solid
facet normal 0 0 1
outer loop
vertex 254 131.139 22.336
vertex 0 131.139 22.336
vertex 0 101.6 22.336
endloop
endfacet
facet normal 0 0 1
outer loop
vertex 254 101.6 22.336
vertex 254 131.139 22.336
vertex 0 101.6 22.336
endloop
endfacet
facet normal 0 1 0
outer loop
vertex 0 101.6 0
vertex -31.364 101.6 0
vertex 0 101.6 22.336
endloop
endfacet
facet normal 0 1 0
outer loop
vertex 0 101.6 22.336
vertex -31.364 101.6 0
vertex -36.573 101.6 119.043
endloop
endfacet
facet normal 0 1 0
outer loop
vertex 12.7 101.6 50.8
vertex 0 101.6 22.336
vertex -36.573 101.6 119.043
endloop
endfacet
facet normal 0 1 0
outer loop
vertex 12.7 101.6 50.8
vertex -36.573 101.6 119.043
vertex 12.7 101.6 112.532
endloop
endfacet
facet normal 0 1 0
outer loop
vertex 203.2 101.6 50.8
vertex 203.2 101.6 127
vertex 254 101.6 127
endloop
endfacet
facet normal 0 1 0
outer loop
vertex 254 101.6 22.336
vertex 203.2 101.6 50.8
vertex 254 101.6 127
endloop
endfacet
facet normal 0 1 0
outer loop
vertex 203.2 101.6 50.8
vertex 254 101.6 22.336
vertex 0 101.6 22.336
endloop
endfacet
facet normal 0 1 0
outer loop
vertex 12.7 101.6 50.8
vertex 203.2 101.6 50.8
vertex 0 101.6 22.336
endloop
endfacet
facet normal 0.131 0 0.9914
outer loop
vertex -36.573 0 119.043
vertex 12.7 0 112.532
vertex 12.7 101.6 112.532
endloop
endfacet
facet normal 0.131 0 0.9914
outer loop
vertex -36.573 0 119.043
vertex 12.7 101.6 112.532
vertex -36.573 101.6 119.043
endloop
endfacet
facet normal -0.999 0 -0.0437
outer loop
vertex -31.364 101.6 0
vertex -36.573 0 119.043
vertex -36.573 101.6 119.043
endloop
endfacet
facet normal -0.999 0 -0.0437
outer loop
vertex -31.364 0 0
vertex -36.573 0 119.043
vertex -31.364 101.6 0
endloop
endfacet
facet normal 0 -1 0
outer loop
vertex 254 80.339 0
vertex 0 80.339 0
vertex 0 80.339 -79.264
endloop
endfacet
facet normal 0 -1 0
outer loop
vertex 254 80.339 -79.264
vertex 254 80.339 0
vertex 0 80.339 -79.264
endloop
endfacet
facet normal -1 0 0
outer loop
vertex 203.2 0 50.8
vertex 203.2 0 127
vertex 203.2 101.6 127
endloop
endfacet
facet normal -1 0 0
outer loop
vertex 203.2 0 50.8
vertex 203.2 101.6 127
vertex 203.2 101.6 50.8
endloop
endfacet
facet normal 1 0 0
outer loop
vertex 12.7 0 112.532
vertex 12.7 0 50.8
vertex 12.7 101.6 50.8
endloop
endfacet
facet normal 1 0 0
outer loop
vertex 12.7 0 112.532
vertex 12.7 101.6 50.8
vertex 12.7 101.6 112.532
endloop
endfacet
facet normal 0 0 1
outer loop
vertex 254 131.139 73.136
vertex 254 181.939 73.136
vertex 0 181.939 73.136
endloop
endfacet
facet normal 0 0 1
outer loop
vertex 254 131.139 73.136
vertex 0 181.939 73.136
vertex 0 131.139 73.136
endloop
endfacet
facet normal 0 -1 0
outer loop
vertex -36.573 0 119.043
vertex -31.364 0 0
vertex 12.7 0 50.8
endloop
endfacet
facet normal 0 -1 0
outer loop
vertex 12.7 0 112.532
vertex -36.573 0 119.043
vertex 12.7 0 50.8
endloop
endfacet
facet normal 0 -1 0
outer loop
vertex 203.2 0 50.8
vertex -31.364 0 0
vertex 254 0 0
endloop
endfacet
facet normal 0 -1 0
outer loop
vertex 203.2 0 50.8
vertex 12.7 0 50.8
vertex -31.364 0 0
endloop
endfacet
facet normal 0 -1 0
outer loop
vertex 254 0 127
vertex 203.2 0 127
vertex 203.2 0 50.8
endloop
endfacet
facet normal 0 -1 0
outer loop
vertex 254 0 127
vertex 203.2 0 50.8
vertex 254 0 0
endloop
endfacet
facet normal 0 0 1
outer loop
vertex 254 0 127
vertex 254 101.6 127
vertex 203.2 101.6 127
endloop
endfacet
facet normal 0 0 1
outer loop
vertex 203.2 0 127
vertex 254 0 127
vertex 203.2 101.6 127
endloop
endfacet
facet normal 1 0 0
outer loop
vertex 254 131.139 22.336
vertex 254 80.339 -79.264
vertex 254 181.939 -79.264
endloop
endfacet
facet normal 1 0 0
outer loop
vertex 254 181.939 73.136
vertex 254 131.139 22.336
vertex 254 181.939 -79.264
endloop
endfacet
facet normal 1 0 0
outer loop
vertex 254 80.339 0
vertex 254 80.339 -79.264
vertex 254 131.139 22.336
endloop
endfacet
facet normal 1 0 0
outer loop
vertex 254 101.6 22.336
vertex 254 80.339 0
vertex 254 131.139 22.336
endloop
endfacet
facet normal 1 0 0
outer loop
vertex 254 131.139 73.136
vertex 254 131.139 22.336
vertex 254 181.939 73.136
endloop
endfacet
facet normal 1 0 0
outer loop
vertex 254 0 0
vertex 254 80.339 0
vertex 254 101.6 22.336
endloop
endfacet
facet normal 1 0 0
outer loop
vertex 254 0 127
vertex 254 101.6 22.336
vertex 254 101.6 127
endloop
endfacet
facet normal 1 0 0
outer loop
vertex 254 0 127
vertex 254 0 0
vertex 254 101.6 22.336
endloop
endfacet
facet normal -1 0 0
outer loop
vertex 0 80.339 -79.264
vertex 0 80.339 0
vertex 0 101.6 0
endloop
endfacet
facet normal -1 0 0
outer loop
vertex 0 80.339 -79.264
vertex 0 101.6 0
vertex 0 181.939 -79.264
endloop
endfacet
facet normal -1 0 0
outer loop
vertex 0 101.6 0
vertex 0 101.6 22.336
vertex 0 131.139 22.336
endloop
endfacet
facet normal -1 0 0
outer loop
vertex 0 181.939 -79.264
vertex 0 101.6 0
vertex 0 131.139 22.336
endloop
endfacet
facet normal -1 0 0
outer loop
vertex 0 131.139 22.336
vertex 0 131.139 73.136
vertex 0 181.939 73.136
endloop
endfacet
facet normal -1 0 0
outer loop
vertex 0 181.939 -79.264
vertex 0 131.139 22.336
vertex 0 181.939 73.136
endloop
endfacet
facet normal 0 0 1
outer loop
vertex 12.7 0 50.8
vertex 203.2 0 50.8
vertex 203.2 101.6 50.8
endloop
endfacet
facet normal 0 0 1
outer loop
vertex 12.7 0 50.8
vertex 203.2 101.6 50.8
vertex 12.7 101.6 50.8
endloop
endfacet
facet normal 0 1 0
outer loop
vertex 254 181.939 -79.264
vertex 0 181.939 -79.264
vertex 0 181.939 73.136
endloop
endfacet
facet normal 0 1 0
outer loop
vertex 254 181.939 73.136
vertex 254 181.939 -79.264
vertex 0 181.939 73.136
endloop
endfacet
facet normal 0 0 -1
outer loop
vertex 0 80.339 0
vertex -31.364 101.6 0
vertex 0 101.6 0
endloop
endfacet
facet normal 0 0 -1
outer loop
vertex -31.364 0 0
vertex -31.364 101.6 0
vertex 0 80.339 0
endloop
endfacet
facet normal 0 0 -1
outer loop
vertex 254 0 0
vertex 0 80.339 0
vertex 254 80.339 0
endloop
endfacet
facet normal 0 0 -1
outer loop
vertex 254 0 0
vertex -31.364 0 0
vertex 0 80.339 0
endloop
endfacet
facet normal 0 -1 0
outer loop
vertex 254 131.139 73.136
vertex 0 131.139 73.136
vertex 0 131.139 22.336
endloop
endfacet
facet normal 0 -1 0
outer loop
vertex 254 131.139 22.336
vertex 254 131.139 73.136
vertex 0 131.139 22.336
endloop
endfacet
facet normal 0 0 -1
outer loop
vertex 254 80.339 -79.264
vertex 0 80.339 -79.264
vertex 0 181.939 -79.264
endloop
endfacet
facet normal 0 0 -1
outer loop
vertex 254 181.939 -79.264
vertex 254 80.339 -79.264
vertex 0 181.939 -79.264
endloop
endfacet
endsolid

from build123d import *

# Parameters (mm, degrees)
F1_DEPTH = 101.6
F3_DEPTH = 254


with BuildPart() as f1:
    # F0 (on Front) → F1 (new body)
    with BuildSketch(Plane.XZ):
        Polygon((-31.363741, 0), (0, 0), (254, 0), (254, 127), (203.2, 127), (203.2, 50.8), (12.7, 50.8), (12.7, 112.531804), (-36.5729, 119.043261), align=None)
    extrude(amount=-F1_DEPTH)

    # F2 (on Right) → F3 (join)
    with BuildSketch(Plane.YZ):
        Polygon((80.338995, 22.33608), (80.338995, -79.26392), (181.938995, -79.26392), (181.938995, 73.13608), (131.138995, 73.13608), (131.138995, 22.33608), align=None)
    extrude(amount=F3_DEPTH)


solid = f1.part
